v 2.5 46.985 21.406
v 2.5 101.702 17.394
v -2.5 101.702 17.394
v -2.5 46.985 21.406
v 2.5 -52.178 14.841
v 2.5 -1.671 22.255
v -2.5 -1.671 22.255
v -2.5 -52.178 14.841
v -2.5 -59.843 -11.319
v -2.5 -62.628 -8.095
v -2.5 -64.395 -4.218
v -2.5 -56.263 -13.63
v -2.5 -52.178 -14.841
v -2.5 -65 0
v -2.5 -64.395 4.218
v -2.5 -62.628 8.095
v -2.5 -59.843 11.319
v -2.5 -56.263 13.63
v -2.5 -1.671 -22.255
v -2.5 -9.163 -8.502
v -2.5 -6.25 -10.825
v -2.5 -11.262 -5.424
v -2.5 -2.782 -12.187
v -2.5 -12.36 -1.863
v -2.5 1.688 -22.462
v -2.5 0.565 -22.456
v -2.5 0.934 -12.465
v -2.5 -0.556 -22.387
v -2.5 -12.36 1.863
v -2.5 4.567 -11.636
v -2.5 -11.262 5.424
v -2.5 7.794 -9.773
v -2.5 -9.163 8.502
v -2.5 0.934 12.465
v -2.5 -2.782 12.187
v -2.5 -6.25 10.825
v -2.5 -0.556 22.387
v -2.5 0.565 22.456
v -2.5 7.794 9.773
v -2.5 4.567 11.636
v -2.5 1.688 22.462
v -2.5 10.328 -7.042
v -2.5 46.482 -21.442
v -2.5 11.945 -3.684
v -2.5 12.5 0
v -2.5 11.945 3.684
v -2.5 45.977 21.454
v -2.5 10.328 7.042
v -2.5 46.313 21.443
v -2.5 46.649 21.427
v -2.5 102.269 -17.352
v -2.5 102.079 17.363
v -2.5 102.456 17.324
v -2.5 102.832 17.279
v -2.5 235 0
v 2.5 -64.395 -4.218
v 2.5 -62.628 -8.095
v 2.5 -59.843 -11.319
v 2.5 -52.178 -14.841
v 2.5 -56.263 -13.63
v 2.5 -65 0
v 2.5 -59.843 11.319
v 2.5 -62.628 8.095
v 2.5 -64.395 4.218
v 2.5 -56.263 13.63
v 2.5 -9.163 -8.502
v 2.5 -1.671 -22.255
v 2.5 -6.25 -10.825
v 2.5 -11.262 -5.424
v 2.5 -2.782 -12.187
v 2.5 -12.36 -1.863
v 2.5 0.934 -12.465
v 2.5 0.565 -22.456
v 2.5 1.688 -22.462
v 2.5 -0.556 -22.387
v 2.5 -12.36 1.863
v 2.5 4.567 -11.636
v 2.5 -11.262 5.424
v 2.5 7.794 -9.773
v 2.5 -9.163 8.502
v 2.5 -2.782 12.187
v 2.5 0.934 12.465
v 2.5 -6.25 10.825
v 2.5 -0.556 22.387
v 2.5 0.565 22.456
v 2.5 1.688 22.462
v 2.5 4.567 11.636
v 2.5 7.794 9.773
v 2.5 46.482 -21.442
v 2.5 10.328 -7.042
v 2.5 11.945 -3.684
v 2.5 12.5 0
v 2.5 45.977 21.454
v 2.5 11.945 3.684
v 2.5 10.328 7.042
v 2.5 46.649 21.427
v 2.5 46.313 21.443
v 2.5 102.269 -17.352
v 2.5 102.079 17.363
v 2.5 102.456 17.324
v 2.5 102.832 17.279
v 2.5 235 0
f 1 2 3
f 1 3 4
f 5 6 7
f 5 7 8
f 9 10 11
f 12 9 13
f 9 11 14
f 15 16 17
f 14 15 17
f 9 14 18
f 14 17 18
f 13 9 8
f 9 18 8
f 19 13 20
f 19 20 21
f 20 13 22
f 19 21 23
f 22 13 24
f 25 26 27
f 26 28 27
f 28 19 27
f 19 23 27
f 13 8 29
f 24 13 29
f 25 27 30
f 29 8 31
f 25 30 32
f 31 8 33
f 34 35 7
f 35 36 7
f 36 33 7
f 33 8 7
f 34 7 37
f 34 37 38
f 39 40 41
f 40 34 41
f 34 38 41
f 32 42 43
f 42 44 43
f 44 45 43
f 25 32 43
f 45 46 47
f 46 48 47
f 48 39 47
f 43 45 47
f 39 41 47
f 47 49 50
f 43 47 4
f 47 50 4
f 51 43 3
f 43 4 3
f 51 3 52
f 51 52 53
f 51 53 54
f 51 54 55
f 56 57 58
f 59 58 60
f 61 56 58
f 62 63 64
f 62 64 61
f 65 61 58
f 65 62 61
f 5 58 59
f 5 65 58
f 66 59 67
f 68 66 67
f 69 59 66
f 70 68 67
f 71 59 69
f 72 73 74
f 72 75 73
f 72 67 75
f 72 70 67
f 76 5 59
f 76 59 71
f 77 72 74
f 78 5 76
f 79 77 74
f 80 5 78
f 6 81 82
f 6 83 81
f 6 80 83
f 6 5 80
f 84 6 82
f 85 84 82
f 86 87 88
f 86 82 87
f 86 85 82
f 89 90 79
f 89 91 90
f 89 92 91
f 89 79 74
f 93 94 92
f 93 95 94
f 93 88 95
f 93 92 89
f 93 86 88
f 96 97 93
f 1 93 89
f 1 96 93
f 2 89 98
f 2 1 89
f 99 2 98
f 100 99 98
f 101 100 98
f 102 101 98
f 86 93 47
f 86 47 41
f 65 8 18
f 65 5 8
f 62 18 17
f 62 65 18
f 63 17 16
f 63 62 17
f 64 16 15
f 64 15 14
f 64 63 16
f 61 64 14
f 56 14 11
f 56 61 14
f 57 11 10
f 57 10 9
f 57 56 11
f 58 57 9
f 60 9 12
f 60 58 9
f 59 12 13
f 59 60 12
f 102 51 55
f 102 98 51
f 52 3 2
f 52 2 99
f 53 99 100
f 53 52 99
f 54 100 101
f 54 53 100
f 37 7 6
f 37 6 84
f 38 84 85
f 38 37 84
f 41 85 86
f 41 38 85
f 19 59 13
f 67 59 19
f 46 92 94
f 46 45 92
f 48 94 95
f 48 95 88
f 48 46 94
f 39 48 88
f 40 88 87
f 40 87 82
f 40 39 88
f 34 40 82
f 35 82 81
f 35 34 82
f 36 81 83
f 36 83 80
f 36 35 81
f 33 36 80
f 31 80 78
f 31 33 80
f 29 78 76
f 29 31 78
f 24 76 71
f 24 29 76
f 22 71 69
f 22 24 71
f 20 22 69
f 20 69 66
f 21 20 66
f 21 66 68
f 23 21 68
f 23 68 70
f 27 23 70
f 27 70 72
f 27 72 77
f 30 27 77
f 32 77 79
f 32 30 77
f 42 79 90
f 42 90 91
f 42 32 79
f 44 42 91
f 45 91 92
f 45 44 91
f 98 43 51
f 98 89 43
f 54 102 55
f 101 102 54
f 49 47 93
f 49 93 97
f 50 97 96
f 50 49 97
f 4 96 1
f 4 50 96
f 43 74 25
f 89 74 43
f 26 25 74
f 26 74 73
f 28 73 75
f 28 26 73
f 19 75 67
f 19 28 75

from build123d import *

# Parameters (mm, degrees)
F0_R        = 12.5
F1_DEPTH    = 2.5
F2_T1_DEPTH = 13.4446230753
F2_T3_DEPTH = 7.5224052146
F2_T5_DEPTH = 7.8412582898


# Not quite as in the source:
# - a fillet or chamfer that OpenCascade refuses, or shapes differently, is made with other operations: its cross-section is extruded or revolved along the edge and cut away or added


with BuildPart() as f1:
    # F0 (on Right) → F1 (new body, symmetric)
    with BuildSketch(Plane.YZ):
        with BuildLine():
            Line((102.2685185185, -17.3523434651), (235, 0))
            Line((235, 0), (102.2685185185, 17.3523434651))
            Line((102.2685185185, 17.3523434651), (46.4815775576, 21.4424473282))
            Line((46.4815775576, 21.4424473282), (0, 22.5))
            Line((0, 22.5), (-52.1784368395, 14.8409707545))
            ThreePointArc((-52.1784368395, 14.8409707545), (-65, 0), (-52.1784368395, -14.8409707545))
            Line((-52.1784368395, -14.8409707545), (0, -22.5))
            Line((0, -22.5), (46.4815775576, -21.4424473282))
            Line((46.4815775576, -21.4424473282), (102.2685185185, -17.3523434651))
        make_face()
        Circle(F0_R, mode=Mode.SUBTRACT)
    extrude(amount=F1_DEPTH, both=True)

    # F2: fillet of radius 20 on 4 edges, made by hand

    # F2_s2 → F2_t1 (cut)
    with BuildSketch(Plane.YZ.offset(-6.7223115376)):
        with BuildLine():
            ThreePointArc((-1.6710187212, 22.25471896), (0.0043749886, 22.428949593), (1.6884876427, 22.4615833904))
            Line((1.6884876427, 22.4615833904), (0, 22.5))
            Line((0, 22.5), (-1.6710187212, 22.25471896))
        make_face()
        with BuildLine():
            ThreePointArc((1.6884876427, -22.4615833904), (0.0043749886, -22.428949593), (-1.6710187212, -22.25471896))
            Line((-1.6710187212, -22.25471896), (0, -22.5))
            Line((0, -22.5), (1.6884876427, -22.4615833904))
        make_face()
    extrude(amount=F2_T1_DEPTH, mode=Mode.SUBTRACT)

    # F2_s4 → F2_t3 (cut)
    with BuildSketch(Plane.YZ.offset(-3.7612026073)):
        with BuildLine():
            ThreePointArc((45.9772270381, 21.4539223527), (46.4812725326, 21.4360931288), (46.9847081711, 21.4055595471))
            Line((46.9847081711, 21.4055595471), (46.4815775576, 21.4424473282))
            Line((46.4815775576, 21.4424473282), (45.9772270381, 21.4539223527))
        make_face()
    extrude(amount=F2_T3_DEPTH, mode=Mode.SUBTRACT)

    # F2_s6 → F2_t5 (cut)
    with BuildSketch(Plane.YZ.offset(-3.9206291449)):
        with BuildLine():
            ThreePointArc((101.7017879955, 17.3938941697), (102.267699979, 17.3443139587), (102.8319755439, 17.2786812132))
            Line((102.8319755439, 17.2786812132), (102.2685185185, 17.3523434651))
            Line((102.2685185185, 17.3523434651), (101.7017879955, 17.3938941697))
        make_face()
    extrude(amount=F2_T5_DEPTH, mode=Mode.SUBTRACT)


solid = f1.part
